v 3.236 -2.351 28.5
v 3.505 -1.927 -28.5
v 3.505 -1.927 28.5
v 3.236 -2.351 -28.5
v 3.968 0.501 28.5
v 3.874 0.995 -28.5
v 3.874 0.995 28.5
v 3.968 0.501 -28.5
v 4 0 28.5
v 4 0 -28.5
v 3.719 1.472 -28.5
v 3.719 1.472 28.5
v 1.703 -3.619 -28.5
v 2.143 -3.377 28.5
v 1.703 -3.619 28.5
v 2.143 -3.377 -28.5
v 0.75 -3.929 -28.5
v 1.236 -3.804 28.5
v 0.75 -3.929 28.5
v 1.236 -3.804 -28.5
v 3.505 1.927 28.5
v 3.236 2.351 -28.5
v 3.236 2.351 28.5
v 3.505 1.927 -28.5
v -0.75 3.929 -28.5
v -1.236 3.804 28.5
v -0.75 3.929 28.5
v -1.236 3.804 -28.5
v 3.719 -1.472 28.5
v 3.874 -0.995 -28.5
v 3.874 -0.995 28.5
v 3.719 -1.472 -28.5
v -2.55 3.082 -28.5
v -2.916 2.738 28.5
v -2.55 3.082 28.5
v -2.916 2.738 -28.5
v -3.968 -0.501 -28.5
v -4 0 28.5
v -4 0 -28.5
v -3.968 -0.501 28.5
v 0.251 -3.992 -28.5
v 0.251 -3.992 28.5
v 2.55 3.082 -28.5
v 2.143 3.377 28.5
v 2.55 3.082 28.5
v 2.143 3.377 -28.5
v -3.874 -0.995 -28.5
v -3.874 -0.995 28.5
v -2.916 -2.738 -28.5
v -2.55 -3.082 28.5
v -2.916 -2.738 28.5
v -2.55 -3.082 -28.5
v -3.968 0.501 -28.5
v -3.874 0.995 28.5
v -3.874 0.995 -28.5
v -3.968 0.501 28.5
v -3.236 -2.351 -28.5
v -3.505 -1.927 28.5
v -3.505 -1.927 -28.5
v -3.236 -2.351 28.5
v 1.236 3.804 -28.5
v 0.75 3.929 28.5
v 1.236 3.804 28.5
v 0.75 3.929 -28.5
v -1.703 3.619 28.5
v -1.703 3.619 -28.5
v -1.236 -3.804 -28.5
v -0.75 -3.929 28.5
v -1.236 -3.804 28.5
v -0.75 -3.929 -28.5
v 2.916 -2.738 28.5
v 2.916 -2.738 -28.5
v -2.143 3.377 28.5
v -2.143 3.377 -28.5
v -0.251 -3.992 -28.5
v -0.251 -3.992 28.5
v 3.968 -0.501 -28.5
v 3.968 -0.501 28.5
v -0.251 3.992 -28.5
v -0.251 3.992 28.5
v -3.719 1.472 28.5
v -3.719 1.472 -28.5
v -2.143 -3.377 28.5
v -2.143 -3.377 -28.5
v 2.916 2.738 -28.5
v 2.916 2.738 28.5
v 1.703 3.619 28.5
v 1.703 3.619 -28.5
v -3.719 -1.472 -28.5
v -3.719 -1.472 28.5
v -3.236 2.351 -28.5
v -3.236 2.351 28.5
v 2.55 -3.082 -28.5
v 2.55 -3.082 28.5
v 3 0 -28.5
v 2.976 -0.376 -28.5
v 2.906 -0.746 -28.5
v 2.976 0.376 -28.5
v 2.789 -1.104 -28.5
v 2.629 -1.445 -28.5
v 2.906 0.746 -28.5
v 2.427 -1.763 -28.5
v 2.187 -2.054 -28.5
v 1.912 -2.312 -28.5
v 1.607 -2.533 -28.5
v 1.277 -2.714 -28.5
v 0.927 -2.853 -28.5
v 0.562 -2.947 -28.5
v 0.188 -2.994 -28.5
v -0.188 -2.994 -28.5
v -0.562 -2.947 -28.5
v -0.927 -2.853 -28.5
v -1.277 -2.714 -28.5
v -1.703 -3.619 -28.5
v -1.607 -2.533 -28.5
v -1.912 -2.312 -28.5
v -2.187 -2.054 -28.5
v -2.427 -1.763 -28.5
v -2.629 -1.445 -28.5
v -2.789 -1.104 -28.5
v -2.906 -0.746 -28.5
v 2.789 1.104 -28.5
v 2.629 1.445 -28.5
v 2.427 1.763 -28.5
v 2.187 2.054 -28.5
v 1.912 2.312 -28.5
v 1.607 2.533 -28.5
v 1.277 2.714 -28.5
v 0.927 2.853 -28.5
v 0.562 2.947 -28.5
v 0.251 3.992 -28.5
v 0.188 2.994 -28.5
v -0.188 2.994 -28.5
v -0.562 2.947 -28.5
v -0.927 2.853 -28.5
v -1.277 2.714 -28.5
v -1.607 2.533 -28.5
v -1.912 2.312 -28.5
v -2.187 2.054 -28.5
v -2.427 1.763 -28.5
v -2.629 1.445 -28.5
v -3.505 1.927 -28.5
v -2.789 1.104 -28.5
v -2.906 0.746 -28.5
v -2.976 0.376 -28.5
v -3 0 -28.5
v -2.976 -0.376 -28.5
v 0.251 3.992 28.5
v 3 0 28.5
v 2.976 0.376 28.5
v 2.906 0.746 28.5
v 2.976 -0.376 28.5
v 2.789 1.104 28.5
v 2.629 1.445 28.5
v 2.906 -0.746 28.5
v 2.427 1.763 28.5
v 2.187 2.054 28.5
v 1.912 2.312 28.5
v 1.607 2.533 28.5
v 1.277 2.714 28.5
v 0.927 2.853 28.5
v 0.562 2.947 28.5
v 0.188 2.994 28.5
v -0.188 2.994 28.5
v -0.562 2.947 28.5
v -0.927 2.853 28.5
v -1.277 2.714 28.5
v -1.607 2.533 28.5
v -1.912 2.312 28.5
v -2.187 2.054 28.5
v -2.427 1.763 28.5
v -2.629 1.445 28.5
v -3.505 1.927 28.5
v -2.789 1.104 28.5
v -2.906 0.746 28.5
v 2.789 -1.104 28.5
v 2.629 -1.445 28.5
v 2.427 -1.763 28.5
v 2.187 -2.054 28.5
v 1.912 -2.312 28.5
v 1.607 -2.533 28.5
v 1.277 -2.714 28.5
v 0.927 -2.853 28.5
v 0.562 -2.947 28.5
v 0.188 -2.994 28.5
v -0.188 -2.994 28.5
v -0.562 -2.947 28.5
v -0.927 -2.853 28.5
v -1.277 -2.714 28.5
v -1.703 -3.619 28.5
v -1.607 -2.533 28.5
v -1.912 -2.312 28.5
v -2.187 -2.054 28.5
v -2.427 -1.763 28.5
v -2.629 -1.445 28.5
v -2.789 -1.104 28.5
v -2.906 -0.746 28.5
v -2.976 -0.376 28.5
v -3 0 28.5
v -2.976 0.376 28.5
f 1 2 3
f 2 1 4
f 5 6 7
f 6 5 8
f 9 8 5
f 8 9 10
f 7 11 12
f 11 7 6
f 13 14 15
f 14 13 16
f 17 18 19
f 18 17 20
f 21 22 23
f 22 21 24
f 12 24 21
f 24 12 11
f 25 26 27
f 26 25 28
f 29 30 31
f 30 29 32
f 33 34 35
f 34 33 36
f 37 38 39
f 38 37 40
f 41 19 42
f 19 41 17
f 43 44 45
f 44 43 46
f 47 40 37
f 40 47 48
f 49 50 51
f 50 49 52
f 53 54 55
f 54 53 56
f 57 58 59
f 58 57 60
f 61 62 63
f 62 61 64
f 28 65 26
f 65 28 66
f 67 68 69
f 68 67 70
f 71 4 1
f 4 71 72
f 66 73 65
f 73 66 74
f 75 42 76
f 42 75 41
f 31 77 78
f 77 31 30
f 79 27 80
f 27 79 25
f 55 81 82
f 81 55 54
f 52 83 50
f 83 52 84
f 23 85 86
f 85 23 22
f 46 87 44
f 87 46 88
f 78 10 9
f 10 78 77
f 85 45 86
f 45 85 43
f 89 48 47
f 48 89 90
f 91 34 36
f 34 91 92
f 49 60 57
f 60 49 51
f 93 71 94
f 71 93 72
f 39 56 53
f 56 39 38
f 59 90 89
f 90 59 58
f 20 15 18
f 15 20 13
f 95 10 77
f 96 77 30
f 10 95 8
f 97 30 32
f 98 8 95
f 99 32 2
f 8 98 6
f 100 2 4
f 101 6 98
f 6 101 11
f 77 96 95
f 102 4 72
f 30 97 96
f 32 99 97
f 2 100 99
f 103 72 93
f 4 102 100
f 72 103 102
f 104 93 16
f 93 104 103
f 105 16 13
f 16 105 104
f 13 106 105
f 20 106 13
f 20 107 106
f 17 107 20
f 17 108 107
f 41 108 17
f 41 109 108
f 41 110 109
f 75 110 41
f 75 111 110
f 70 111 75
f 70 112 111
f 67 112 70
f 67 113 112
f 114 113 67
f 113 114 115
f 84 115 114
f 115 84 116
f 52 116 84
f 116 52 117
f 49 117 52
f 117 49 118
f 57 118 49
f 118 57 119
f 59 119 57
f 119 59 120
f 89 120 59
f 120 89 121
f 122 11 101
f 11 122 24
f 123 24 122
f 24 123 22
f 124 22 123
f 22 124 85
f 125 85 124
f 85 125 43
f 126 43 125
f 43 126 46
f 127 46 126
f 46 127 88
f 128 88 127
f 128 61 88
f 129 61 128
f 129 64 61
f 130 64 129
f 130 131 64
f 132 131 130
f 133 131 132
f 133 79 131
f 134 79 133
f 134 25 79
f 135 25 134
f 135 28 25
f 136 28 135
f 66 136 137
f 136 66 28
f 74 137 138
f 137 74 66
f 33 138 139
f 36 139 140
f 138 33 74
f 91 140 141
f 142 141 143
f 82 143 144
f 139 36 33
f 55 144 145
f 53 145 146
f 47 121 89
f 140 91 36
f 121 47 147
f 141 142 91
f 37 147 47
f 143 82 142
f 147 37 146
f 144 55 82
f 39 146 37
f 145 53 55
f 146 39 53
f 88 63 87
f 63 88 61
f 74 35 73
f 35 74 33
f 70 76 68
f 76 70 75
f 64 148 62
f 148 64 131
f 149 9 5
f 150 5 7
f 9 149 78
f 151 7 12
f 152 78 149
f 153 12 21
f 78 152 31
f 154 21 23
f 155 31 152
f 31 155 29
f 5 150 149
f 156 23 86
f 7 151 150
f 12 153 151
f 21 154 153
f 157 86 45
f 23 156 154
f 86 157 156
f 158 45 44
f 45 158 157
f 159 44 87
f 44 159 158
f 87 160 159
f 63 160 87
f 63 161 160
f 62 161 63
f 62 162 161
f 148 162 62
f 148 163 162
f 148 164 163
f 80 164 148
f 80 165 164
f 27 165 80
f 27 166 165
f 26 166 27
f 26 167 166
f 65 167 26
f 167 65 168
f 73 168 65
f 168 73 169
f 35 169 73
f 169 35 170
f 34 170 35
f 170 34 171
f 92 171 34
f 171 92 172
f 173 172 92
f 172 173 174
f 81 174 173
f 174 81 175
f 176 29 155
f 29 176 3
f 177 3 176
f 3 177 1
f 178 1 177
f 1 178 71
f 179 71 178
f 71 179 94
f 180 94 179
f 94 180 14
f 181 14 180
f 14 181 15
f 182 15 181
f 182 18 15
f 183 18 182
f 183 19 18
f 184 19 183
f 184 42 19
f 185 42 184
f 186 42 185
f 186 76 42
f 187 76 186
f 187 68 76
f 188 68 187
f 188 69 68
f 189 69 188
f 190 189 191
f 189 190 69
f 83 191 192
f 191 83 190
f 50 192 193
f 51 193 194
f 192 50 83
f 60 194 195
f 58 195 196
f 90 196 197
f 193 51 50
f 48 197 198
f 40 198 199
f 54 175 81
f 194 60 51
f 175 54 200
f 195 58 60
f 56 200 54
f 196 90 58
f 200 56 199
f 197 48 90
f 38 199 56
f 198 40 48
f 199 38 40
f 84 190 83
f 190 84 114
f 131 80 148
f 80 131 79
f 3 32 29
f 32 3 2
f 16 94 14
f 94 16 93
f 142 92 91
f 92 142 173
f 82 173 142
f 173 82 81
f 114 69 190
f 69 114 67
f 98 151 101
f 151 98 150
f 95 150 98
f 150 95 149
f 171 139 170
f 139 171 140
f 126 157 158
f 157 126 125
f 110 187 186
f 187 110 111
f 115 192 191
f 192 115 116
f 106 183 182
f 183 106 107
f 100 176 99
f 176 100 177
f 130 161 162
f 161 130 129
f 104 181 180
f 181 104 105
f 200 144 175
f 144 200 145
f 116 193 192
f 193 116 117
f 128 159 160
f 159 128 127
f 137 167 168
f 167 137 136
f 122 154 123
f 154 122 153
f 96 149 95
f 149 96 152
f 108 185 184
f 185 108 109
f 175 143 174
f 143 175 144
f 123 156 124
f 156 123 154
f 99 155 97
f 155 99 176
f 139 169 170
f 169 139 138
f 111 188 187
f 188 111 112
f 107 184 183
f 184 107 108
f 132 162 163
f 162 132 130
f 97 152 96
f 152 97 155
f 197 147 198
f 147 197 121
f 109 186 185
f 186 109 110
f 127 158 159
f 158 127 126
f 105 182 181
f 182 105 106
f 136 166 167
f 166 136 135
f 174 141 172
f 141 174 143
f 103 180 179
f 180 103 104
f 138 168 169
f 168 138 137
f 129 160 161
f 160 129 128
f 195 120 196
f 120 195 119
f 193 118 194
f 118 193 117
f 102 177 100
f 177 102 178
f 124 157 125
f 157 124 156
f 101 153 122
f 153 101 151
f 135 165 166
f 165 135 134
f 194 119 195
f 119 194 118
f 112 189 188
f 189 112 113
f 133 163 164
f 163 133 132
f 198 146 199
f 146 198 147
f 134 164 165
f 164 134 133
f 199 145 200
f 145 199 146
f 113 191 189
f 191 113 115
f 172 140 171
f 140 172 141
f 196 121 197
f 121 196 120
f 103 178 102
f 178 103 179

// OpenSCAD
$fn = 50;


difference() {
	union() {
		translate(v = [0, 0, -28.5000000000]) {
			cylinder(h = 57, r = 4.0000000000);
		}
	}
	union() {
		translate(v = [0, 0, -100.0000000000]) {
			cylinder(h = 200, r = 3.0000000000);
		}
	}
}
